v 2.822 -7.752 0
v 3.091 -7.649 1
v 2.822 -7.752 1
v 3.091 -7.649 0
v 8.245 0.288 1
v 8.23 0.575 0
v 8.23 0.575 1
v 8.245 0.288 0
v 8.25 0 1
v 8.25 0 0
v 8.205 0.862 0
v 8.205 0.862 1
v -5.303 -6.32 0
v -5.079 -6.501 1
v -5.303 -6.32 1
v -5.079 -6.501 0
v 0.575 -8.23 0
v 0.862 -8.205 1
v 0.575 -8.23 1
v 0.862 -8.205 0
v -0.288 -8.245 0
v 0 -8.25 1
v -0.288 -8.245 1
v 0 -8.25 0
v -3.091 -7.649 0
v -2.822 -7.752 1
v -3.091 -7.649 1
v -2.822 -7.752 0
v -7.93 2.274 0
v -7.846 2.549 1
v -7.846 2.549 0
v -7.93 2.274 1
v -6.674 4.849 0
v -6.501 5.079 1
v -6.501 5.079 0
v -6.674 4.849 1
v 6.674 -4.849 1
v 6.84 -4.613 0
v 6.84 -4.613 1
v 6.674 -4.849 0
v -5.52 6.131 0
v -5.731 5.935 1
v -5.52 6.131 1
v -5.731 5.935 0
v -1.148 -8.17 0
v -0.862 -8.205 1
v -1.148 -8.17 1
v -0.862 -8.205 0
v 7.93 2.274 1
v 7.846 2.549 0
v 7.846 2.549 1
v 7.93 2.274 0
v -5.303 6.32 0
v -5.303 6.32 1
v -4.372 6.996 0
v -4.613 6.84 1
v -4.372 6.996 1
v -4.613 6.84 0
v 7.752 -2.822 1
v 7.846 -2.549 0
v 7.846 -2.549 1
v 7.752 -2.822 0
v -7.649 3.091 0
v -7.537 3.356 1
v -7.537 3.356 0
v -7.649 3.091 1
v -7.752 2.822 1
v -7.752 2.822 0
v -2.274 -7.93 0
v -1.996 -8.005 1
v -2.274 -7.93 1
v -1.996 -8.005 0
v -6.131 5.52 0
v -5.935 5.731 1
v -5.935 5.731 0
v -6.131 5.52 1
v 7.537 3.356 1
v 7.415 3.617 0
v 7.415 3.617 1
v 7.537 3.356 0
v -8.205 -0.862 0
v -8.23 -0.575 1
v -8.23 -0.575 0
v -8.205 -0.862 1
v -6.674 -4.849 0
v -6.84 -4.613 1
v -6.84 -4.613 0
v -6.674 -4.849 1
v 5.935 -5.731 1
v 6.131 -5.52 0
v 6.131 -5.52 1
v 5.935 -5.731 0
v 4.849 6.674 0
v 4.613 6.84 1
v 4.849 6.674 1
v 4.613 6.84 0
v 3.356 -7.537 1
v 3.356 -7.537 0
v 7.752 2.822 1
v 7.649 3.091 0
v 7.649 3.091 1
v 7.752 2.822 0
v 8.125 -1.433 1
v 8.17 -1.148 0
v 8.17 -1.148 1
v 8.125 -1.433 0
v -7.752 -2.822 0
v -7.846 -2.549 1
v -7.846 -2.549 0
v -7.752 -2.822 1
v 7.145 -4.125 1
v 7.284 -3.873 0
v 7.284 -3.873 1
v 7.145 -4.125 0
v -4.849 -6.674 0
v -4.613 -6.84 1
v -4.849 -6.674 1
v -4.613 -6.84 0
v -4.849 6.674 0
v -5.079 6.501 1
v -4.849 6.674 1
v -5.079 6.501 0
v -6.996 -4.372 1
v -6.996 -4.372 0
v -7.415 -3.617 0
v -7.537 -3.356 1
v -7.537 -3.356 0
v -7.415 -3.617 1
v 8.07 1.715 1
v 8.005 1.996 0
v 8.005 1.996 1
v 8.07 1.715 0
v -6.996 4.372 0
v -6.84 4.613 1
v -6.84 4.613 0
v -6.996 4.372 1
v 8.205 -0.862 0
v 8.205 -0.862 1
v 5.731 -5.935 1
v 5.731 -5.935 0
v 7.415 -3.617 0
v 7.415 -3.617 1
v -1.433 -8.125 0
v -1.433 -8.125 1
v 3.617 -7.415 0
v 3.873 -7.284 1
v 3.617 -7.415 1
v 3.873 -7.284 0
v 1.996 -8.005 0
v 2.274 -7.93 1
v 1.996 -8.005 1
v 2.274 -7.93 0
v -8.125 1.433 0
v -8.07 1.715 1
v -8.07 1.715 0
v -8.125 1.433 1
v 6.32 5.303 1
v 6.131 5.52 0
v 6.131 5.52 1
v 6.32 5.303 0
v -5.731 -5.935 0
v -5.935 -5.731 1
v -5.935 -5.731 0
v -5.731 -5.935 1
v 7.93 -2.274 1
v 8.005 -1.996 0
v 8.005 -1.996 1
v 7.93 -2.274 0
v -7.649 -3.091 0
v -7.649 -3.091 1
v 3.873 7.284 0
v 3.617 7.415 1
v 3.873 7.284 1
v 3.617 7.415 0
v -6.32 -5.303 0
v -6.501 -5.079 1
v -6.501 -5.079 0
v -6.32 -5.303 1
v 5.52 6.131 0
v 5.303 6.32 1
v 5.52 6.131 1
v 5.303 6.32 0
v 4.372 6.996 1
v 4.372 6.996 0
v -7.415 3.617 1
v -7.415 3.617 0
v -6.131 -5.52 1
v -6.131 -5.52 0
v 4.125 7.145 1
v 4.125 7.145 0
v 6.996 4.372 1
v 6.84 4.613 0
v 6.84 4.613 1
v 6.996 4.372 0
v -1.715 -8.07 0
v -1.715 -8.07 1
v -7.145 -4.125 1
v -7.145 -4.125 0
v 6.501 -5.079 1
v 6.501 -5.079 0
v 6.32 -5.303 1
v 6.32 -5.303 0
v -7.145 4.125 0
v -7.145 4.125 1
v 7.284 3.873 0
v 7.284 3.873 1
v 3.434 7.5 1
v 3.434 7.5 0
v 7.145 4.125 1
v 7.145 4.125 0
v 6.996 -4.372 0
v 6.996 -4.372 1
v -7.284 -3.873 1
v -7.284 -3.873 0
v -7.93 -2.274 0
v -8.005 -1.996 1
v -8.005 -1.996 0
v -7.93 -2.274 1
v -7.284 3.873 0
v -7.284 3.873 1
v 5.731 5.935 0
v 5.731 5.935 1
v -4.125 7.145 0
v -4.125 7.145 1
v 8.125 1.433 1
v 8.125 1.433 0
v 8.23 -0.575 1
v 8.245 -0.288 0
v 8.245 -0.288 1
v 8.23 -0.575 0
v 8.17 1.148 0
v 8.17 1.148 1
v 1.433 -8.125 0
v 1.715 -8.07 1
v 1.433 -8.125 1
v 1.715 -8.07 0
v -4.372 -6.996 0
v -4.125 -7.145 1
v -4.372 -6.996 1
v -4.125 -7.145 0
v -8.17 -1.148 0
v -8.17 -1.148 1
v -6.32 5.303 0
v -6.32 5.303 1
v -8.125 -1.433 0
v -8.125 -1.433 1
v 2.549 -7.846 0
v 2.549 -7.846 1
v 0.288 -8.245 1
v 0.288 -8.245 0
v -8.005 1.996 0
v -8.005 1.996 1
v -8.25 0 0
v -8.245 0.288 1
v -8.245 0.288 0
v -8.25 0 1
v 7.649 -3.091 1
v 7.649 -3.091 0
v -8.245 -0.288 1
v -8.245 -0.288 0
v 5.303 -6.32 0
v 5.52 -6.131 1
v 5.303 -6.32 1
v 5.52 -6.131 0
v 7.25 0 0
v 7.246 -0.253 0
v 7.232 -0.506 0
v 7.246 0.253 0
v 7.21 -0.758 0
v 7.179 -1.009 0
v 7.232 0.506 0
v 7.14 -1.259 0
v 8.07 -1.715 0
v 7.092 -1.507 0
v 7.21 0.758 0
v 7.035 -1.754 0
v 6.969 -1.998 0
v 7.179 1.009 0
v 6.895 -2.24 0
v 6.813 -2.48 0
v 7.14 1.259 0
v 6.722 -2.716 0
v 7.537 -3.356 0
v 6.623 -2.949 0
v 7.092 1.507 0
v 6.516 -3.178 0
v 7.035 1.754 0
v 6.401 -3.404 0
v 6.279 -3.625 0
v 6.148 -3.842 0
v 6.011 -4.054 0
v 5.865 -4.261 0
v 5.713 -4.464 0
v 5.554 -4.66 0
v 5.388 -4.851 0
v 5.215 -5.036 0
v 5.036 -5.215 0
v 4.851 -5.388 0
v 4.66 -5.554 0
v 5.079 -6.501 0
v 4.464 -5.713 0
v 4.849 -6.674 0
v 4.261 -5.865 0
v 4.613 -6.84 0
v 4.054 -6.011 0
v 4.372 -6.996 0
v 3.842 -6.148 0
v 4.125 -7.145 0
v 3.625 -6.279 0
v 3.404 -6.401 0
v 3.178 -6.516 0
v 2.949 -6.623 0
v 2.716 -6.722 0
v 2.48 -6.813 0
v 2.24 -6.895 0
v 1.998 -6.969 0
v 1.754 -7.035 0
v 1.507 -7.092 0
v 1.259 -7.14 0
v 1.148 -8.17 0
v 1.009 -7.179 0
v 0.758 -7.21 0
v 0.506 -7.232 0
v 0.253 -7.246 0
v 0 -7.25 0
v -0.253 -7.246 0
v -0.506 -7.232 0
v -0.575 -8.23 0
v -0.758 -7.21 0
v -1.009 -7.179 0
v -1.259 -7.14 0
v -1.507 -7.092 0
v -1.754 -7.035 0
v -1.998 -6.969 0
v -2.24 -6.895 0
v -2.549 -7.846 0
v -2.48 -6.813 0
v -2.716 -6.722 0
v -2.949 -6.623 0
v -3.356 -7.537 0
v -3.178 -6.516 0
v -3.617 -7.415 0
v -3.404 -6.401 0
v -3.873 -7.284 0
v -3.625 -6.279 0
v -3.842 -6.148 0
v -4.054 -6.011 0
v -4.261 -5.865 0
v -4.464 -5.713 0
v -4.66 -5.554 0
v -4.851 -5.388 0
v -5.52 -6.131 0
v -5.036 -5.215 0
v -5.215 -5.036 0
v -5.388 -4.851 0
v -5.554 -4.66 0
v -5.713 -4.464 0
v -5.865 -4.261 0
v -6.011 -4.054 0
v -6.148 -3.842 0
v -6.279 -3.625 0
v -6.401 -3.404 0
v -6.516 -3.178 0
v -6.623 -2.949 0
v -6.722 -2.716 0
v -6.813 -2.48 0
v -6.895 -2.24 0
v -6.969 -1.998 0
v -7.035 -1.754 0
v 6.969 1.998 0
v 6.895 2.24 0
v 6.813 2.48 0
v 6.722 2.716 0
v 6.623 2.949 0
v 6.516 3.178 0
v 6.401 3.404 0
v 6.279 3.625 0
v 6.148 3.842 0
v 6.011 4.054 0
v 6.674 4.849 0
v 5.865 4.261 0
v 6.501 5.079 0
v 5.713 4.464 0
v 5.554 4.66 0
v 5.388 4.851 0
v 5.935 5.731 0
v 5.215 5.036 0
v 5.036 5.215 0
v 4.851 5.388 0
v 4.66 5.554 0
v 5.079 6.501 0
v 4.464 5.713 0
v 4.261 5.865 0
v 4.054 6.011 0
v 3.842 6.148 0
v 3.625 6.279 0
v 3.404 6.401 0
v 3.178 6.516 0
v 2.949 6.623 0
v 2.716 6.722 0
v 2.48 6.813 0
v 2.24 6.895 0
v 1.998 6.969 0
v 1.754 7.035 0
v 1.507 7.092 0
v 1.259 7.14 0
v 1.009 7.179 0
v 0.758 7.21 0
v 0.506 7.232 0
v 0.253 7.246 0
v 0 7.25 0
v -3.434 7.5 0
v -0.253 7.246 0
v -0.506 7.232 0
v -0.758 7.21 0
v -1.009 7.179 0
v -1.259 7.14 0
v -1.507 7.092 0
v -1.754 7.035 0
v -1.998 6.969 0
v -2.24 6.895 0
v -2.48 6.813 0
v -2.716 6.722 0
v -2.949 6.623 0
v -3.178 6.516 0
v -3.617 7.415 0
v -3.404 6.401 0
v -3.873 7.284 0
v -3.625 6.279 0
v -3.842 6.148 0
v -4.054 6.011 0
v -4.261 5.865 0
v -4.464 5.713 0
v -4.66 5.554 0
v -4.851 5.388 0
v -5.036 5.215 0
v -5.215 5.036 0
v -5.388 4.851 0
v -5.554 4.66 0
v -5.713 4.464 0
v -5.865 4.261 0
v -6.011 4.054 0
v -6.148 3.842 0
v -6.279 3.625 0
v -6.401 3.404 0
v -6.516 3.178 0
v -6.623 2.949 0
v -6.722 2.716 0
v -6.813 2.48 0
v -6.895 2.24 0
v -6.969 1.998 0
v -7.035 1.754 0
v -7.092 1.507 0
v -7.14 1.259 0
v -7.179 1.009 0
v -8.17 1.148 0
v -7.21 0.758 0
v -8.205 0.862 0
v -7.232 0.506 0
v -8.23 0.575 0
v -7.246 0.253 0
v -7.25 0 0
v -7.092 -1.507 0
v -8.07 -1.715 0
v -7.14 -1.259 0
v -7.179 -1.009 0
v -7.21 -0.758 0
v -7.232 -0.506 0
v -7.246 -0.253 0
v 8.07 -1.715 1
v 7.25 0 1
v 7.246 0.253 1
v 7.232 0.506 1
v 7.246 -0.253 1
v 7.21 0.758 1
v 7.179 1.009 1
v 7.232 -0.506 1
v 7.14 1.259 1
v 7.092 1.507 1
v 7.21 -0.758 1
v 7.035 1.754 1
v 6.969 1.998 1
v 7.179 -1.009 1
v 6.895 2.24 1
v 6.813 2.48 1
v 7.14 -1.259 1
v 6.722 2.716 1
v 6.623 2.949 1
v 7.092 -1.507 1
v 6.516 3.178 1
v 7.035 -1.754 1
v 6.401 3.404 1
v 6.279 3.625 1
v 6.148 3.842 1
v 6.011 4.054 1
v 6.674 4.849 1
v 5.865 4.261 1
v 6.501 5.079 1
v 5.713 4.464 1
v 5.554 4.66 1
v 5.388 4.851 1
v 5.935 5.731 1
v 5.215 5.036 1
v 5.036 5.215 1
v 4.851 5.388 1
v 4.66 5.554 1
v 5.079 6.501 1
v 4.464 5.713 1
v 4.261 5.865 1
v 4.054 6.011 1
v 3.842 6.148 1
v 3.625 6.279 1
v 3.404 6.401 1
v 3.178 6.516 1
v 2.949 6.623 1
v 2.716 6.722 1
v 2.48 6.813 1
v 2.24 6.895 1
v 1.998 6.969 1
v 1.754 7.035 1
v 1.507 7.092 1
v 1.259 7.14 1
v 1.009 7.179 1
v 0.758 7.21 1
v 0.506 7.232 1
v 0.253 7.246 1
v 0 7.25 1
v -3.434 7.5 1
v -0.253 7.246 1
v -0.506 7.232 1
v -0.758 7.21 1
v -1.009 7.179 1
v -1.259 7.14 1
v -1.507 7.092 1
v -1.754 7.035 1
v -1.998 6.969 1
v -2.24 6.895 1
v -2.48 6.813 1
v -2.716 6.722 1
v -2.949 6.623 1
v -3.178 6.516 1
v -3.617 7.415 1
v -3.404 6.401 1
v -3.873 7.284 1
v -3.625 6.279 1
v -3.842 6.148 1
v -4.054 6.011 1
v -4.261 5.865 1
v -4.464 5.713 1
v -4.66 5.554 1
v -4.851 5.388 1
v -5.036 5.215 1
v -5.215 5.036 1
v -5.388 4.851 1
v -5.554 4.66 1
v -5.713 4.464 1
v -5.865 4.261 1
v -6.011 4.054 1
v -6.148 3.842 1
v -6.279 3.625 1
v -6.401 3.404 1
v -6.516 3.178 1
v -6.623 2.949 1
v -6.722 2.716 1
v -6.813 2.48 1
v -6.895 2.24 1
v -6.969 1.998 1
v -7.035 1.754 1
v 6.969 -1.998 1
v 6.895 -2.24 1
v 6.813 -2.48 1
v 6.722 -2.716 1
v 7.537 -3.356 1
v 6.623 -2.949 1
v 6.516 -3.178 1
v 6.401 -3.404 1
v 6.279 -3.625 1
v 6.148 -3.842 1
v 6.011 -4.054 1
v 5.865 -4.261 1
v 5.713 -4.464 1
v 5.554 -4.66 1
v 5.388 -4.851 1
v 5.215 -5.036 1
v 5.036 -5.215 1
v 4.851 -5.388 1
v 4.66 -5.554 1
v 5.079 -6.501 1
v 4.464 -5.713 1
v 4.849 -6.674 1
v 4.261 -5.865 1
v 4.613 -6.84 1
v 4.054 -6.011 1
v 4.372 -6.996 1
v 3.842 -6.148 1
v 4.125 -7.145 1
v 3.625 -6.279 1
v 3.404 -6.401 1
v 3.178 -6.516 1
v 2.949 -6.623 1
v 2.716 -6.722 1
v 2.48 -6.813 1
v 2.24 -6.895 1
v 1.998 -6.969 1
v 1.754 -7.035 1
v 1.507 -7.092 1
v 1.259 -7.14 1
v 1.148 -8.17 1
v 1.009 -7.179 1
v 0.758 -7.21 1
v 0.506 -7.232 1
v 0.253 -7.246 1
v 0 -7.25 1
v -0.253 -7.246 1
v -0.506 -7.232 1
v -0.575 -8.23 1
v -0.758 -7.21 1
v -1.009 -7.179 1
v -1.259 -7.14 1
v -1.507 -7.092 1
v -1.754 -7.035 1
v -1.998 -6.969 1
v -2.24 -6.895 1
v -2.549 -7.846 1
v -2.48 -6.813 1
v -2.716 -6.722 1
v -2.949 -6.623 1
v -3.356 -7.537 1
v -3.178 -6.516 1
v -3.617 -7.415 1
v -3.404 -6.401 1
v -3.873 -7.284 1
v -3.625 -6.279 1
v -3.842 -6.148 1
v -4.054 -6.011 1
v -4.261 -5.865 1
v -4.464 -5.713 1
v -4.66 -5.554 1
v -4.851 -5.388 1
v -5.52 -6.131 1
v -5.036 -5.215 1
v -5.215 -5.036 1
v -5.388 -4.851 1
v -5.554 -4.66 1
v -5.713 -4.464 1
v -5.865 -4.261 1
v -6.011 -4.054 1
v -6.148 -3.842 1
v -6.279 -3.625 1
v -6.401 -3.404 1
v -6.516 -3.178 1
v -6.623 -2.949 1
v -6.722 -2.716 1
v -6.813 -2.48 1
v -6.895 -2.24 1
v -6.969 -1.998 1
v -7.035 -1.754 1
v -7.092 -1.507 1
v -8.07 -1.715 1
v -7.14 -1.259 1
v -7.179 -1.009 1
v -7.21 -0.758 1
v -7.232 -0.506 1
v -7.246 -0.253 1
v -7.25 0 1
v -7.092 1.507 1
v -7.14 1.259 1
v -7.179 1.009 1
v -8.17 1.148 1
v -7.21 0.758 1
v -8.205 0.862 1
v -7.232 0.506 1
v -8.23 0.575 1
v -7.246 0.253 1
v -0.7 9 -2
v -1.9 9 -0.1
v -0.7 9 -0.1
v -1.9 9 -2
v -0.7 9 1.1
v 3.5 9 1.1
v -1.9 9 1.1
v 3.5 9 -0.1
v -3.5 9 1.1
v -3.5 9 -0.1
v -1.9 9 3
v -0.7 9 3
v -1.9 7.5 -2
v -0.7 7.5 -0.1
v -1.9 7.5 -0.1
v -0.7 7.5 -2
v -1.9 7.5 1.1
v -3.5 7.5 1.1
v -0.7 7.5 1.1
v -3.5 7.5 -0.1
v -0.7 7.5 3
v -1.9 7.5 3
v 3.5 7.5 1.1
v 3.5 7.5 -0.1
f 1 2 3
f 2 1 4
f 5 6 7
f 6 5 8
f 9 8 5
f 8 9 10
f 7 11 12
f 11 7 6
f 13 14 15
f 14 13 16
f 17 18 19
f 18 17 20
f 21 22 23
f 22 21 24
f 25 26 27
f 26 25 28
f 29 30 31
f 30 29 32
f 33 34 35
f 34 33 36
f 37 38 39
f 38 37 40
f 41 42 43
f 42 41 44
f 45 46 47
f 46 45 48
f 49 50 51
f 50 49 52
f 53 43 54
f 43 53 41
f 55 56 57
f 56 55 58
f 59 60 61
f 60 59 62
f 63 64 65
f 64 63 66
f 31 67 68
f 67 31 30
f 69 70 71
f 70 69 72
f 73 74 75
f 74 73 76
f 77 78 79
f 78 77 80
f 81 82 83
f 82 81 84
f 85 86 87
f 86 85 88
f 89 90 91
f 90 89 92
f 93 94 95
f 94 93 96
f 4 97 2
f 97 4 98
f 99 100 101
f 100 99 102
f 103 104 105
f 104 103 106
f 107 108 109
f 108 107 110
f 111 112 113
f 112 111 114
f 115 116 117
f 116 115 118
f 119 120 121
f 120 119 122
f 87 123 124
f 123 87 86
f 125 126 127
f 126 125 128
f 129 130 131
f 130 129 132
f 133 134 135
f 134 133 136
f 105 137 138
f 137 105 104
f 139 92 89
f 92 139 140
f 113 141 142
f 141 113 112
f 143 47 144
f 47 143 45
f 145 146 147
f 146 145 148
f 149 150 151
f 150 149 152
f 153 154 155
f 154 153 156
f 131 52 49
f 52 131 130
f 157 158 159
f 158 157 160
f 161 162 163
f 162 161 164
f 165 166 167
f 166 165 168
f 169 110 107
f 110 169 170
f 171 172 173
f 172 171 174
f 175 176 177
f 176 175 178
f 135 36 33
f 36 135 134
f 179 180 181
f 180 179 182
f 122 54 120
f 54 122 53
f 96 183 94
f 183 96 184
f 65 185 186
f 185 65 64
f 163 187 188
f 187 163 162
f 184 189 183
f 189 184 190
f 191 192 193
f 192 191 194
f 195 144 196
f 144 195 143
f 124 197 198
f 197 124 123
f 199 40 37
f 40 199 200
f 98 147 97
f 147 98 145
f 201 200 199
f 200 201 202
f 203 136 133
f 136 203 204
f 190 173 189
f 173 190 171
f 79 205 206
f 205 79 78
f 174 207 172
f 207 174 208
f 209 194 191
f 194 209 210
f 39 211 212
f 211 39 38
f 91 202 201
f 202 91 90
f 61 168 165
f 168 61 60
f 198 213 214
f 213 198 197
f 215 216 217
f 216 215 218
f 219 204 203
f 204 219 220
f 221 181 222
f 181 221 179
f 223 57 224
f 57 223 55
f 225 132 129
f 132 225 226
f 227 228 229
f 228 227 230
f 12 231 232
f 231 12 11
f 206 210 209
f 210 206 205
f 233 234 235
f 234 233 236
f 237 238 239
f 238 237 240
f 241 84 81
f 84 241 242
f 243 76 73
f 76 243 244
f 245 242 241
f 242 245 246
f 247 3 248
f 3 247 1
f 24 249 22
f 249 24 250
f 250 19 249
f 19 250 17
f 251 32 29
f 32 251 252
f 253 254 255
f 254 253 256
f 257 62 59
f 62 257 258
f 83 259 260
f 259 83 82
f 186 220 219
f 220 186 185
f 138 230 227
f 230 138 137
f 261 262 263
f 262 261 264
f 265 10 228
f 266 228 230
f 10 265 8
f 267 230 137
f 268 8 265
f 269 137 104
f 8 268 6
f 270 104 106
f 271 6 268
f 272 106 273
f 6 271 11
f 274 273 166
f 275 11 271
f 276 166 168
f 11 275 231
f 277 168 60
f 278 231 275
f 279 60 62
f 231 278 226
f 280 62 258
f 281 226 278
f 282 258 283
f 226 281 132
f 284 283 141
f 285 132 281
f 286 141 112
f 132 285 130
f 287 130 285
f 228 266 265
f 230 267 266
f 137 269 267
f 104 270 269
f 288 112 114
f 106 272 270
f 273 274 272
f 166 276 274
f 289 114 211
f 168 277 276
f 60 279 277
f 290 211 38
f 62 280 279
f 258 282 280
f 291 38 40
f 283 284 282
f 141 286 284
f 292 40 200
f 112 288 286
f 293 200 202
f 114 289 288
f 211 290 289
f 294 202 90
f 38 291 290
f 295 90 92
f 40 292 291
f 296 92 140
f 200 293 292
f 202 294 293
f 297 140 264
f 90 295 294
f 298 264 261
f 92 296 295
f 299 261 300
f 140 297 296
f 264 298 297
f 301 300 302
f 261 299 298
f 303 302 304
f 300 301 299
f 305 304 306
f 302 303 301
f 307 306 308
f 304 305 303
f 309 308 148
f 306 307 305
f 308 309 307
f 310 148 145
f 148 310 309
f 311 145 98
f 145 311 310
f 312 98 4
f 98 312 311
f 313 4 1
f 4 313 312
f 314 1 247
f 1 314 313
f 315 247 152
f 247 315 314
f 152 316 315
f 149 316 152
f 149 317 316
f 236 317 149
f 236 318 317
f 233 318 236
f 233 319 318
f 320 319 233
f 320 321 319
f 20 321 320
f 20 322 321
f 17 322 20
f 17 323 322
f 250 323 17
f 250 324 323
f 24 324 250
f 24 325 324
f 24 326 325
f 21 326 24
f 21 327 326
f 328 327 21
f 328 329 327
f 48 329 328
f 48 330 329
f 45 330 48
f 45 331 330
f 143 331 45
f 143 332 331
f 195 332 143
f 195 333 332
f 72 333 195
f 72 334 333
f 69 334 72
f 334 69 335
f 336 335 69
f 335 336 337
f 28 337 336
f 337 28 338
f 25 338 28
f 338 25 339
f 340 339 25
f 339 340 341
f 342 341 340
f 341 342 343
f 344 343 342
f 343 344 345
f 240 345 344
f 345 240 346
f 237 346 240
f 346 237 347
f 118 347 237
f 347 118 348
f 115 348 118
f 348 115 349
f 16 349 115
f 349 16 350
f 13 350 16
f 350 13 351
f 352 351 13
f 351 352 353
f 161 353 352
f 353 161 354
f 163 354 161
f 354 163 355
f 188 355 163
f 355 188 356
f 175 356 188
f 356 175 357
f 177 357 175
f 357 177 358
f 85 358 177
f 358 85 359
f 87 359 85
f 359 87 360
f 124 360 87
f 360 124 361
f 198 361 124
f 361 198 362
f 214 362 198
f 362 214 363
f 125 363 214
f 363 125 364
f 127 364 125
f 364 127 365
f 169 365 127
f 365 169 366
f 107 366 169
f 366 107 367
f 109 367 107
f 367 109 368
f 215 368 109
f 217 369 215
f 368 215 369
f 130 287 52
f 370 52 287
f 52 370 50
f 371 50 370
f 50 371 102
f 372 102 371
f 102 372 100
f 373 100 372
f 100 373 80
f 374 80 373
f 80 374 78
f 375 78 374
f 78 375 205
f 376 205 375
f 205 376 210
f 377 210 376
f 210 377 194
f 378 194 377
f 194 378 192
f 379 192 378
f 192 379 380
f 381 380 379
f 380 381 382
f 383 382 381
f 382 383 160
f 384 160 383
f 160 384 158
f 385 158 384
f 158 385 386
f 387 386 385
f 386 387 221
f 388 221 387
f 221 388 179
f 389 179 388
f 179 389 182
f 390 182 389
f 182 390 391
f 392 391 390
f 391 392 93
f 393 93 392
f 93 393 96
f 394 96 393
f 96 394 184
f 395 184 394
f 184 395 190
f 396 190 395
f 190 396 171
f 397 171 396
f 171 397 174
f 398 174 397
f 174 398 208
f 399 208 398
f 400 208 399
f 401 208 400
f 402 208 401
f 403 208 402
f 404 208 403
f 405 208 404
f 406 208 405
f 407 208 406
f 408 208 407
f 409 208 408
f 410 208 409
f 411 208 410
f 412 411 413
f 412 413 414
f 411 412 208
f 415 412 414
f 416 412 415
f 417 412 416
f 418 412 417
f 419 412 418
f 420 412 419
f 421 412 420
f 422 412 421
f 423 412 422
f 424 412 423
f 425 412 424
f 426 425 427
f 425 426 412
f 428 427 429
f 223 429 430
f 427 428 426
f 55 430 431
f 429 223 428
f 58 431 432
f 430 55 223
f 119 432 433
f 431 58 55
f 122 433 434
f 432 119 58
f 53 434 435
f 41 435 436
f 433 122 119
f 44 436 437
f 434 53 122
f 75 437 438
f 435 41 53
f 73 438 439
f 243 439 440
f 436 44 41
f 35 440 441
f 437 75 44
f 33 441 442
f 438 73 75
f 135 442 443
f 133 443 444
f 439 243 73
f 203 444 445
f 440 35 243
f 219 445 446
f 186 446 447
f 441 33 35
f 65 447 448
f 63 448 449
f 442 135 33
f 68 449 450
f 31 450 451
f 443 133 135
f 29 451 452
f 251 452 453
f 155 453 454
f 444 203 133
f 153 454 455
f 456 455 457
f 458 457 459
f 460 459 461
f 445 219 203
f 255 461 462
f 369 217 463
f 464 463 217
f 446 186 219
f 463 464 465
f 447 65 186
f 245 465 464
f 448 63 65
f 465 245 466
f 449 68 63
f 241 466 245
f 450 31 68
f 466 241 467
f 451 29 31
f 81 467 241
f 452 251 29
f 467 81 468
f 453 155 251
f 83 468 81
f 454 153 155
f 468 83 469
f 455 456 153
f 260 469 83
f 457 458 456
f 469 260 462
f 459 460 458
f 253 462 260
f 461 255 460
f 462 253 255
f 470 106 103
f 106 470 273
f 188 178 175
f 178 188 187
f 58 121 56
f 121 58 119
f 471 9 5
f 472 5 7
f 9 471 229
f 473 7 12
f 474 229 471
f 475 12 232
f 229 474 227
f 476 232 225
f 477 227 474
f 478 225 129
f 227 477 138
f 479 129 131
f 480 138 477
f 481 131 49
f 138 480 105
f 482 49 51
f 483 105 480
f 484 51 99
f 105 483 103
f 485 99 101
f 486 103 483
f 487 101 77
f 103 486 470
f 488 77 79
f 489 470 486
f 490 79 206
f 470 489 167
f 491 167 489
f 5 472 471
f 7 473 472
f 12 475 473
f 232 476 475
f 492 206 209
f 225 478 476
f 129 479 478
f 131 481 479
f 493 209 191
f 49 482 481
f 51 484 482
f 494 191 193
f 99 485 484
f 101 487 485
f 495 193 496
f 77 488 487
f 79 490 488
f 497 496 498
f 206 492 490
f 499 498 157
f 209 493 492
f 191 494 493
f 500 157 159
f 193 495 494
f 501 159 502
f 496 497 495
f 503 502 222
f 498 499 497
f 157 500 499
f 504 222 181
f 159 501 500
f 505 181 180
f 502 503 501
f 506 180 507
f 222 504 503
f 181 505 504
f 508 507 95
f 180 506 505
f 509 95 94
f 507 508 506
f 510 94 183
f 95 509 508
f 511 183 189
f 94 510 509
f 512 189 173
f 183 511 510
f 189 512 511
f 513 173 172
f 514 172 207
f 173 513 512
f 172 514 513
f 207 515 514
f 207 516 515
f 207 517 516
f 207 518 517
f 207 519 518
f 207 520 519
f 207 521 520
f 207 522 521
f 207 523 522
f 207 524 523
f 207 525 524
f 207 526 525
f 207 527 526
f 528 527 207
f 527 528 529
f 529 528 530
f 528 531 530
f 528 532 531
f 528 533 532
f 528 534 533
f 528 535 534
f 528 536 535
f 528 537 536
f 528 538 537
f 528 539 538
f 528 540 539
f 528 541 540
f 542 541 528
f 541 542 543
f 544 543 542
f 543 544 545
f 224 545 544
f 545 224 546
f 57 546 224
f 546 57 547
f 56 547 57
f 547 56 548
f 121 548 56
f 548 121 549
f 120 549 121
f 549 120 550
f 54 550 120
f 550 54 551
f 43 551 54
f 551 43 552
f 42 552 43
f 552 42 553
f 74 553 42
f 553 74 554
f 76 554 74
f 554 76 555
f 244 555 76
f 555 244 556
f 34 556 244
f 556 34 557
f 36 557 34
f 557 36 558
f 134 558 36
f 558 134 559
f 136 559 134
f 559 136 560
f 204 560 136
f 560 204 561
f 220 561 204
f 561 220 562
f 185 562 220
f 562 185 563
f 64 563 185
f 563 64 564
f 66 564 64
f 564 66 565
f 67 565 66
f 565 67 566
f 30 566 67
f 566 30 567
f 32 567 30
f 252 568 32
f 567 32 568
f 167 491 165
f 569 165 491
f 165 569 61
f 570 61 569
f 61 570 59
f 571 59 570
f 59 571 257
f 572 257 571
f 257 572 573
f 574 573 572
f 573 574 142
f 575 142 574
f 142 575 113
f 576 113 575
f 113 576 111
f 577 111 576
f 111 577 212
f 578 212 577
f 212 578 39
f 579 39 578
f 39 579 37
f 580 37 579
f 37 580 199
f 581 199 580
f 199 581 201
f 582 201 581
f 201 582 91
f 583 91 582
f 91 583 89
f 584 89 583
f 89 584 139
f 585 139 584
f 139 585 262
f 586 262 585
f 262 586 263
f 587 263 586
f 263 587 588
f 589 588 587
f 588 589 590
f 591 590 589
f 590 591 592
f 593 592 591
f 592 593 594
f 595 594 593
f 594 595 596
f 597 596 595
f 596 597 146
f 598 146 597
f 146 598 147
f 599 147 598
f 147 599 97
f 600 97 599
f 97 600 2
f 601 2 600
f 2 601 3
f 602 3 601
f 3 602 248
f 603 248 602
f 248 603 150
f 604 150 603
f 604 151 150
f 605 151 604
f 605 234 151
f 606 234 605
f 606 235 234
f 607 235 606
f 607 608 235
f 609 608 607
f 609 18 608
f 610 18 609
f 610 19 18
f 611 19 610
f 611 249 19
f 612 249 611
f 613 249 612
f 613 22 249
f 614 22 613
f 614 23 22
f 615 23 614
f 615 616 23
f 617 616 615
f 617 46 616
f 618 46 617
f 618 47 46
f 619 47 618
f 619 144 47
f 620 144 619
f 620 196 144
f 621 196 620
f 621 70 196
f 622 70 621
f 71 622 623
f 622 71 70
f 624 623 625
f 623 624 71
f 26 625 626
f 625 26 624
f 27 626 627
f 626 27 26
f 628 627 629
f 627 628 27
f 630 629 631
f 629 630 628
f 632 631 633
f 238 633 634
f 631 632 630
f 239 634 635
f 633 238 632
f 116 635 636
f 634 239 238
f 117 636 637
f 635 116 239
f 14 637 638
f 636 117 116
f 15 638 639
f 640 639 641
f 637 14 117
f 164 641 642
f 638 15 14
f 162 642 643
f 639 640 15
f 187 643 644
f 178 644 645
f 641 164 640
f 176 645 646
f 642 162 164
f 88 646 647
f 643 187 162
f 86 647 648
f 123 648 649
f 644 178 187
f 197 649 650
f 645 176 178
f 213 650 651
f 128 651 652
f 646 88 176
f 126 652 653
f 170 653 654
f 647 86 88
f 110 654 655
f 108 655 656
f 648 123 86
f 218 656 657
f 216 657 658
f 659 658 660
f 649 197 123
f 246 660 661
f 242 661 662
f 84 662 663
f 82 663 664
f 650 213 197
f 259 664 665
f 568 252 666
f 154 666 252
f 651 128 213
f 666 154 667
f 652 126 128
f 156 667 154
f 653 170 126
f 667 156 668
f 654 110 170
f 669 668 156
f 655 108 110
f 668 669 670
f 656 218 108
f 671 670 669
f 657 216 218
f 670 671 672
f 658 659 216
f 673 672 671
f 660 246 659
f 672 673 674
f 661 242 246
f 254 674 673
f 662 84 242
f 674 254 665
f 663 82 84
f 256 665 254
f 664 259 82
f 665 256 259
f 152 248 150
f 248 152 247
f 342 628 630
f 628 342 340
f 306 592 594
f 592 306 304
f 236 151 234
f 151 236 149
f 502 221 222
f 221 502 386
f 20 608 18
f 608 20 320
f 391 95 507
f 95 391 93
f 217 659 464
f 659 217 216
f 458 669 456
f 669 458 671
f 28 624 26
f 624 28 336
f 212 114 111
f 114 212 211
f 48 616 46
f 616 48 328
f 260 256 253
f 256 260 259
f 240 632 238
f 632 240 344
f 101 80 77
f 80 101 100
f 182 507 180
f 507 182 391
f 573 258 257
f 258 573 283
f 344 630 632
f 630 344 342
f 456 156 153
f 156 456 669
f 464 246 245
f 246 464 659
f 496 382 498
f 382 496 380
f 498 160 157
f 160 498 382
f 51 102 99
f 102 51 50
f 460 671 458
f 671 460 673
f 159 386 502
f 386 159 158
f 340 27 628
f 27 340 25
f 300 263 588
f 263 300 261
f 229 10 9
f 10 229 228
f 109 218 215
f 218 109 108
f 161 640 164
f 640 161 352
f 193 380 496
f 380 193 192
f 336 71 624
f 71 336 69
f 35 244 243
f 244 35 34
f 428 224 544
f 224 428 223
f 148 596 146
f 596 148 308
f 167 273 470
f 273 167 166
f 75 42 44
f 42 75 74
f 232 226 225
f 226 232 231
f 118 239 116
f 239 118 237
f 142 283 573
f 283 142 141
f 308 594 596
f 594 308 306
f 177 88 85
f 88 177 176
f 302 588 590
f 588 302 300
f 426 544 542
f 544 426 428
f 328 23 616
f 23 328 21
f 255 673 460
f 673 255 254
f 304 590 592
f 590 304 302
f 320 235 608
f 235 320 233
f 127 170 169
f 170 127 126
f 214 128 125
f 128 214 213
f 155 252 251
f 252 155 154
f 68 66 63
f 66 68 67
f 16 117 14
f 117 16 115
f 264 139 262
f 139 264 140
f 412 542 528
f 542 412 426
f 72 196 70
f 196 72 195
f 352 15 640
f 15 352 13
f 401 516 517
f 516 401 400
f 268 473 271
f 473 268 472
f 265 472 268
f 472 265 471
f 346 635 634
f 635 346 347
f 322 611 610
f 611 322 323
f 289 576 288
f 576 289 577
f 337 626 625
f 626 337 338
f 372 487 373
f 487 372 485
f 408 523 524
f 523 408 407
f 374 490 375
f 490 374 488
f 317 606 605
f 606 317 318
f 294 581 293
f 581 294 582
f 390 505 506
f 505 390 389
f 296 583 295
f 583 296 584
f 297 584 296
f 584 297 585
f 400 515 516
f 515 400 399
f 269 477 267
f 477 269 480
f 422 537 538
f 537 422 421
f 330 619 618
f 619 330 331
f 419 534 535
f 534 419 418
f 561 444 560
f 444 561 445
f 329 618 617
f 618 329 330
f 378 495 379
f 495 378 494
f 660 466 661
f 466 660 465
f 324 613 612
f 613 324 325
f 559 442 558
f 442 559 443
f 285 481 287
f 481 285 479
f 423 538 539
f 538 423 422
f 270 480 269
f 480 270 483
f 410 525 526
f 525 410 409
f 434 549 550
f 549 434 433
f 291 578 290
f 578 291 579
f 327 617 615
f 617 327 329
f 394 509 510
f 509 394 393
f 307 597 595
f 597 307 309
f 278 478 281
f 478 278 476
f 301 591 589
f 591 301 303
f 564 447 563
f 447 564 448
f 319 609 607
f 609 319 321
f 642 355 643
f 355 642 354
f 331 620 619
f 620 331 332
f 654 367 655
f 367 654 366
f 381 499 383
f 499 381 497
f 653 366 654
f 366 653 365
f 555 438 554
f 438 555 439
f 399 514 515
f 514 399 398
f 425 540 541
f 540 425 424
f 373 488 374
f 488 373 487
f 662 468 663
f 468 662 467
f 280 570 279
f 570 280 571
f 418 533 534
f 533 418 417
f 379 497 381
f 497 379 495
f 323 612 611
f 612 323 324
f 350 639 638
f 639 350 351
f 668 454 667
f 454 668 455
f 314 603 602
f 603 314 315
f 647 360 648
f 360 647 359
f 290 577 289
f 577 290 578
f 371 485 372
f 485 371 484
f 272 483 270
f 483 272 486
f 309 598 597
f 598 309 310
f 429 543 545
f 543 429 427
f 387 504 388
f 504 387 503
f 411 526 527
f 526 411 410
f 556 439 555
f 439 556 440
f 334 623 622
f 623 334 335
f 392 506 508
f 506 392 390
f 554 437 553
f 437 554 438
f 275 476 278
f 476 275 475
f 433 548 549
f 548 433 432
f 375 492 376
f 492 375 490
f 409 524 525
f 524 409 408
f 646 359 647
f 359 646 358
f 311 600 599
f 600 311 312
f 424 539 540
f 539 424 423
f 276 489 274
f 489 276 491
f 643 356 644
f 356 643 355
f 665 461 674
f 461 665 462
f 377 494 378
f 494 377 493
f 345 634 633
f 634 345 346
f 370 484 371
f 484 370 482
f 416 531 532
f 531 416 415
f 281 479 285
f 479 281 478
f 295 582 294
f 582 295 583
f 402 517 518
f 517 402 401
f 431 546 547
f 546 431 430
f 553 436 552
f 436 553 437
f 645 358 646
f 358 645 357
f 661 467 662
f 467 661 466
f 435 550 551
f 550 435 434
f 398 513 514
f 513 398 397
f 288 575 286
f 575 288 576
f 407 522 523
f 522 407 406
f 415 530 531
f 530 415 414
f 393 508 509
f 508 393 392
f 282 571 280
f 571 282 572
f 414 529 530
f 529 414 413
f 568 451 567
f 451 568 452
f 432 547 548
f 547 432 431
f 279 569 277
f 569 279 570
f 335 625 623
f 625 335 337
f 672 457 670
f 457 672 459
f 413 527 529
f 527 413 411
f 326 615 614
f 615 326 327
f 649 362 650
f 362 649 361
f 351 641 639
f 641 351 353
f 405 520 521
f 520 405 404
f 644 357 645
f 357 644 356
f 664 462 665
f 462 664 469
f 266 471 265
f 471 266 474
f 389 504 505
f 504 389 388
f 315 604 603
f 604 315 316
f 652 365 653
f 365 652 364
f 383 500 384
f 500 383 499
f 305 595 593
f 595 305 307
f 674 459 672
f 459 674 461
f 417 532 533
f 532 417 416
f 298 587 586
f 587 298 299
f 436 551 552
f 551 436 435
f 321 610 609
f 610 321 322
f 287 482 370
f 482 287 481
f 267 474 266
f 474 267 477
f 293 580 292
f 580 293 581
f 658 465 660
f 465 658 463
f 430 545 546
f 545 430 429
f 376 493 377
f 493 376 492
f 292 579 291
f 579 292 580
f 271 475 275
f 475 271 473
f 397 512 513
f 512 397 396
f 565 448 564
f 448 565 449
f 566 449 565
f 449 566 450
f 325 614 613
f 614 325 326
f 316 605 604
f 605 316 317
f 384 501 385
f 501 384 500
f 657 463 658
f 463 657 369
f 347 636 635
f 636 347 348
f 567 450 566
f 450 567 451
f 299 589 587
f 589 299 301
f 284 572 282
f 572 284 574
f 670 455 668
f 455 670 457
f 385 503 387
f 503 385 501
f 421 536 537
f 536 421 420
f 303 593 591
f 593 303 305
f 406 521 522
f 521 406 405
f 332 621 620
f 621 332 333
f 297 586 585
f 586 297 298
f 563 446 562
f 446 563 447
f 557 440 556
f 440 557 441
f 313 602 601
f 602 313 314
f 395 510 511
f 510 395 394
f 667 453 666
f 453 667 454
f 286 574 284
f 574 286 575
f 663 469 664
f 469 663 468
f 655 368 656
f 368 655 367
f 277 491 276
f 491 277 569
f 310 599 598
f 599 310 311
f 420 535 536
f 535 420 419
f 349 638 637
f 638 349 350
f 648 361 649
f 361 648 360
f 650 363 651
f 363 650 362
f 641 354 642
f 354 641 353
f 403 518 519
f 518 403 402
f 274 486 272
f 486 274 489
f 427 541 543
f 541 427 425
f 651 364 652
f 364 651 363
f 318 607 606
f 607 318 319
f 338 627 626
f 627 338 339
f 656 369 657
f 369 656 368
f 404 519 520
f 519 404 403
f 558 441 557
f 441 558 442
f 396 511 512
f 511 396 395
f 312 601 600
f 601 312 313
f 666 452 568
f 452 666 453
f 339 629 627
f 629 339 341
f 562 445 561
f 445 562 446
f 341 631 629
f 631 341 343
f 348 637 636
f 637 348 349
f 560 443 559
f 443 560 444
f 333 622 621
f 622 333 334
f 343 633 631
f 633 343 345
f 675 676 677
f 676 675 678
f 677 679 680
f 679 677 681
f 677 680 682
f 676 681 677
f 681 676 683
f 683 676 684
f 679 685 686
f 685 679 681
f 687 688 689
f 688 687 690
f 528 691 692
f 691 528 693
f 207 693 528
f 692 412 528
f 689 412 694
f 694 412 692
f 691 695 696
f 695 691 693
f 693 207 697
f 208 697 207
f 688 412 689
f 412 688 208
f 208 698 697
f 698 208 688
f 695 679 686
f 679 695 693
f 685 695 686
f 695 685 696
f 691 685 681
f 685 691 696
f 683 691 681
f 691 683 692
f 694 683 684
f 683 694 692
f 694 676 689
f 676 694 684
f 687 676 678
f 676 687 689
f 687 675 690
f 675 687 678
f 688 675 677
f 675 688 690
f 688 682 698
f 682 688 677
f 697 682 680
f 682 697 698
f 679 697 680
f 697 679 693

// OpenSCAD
// Cross Ring (IMG_1015)
// A simple ring with a cross decoration on top

// Parameters
ring_diameter = 14.5;      // Inner diameter of ring (adjust for finger size)
band_thickness = 1;      // Thickness of the band
band_height = 1;         // Height of the band
cross_width = 5;         // Width of the cross
cross_height = 7;        // Height of the cross
cross_thickness = 1.2;   // Thickness of cross arms

$fn = 180;

module cross_2d() {
    union() {
        // Vertical arm
        translate([-cross_thickness/2, 0, 0])
            square([cross_thickness, cross_height]);

        // Horizontal arm (positioned higher up on the vertical)
        translate([-cross_width/2, cross_height*0.6, 0])
            square([cross_width, cross_thickness]);
    }
}

module cross_ring() {
    union() {
        // Main band
        difference() {
            cylinder(h=band_height, d=ring_diameter + 2*band_thickness);
            translate([0, 0, -0.5])
                cylinder(h=band_height + 1, d=ring_diameter);
        }

        // Cross decoration on outside of ring
        translate([0, ring_diameter/2 + band_thickness, band_height/2]) {
            rotate([90, 0, 0]) {
                linear_extrude(height=1.5, center=true) {
                    rotate([0, 0, 90]) {
                        translate([0, -cross_height/2, 0])
                            cross_2d();
                    }
                }
            }
        }
    }
}

cross_ring();
